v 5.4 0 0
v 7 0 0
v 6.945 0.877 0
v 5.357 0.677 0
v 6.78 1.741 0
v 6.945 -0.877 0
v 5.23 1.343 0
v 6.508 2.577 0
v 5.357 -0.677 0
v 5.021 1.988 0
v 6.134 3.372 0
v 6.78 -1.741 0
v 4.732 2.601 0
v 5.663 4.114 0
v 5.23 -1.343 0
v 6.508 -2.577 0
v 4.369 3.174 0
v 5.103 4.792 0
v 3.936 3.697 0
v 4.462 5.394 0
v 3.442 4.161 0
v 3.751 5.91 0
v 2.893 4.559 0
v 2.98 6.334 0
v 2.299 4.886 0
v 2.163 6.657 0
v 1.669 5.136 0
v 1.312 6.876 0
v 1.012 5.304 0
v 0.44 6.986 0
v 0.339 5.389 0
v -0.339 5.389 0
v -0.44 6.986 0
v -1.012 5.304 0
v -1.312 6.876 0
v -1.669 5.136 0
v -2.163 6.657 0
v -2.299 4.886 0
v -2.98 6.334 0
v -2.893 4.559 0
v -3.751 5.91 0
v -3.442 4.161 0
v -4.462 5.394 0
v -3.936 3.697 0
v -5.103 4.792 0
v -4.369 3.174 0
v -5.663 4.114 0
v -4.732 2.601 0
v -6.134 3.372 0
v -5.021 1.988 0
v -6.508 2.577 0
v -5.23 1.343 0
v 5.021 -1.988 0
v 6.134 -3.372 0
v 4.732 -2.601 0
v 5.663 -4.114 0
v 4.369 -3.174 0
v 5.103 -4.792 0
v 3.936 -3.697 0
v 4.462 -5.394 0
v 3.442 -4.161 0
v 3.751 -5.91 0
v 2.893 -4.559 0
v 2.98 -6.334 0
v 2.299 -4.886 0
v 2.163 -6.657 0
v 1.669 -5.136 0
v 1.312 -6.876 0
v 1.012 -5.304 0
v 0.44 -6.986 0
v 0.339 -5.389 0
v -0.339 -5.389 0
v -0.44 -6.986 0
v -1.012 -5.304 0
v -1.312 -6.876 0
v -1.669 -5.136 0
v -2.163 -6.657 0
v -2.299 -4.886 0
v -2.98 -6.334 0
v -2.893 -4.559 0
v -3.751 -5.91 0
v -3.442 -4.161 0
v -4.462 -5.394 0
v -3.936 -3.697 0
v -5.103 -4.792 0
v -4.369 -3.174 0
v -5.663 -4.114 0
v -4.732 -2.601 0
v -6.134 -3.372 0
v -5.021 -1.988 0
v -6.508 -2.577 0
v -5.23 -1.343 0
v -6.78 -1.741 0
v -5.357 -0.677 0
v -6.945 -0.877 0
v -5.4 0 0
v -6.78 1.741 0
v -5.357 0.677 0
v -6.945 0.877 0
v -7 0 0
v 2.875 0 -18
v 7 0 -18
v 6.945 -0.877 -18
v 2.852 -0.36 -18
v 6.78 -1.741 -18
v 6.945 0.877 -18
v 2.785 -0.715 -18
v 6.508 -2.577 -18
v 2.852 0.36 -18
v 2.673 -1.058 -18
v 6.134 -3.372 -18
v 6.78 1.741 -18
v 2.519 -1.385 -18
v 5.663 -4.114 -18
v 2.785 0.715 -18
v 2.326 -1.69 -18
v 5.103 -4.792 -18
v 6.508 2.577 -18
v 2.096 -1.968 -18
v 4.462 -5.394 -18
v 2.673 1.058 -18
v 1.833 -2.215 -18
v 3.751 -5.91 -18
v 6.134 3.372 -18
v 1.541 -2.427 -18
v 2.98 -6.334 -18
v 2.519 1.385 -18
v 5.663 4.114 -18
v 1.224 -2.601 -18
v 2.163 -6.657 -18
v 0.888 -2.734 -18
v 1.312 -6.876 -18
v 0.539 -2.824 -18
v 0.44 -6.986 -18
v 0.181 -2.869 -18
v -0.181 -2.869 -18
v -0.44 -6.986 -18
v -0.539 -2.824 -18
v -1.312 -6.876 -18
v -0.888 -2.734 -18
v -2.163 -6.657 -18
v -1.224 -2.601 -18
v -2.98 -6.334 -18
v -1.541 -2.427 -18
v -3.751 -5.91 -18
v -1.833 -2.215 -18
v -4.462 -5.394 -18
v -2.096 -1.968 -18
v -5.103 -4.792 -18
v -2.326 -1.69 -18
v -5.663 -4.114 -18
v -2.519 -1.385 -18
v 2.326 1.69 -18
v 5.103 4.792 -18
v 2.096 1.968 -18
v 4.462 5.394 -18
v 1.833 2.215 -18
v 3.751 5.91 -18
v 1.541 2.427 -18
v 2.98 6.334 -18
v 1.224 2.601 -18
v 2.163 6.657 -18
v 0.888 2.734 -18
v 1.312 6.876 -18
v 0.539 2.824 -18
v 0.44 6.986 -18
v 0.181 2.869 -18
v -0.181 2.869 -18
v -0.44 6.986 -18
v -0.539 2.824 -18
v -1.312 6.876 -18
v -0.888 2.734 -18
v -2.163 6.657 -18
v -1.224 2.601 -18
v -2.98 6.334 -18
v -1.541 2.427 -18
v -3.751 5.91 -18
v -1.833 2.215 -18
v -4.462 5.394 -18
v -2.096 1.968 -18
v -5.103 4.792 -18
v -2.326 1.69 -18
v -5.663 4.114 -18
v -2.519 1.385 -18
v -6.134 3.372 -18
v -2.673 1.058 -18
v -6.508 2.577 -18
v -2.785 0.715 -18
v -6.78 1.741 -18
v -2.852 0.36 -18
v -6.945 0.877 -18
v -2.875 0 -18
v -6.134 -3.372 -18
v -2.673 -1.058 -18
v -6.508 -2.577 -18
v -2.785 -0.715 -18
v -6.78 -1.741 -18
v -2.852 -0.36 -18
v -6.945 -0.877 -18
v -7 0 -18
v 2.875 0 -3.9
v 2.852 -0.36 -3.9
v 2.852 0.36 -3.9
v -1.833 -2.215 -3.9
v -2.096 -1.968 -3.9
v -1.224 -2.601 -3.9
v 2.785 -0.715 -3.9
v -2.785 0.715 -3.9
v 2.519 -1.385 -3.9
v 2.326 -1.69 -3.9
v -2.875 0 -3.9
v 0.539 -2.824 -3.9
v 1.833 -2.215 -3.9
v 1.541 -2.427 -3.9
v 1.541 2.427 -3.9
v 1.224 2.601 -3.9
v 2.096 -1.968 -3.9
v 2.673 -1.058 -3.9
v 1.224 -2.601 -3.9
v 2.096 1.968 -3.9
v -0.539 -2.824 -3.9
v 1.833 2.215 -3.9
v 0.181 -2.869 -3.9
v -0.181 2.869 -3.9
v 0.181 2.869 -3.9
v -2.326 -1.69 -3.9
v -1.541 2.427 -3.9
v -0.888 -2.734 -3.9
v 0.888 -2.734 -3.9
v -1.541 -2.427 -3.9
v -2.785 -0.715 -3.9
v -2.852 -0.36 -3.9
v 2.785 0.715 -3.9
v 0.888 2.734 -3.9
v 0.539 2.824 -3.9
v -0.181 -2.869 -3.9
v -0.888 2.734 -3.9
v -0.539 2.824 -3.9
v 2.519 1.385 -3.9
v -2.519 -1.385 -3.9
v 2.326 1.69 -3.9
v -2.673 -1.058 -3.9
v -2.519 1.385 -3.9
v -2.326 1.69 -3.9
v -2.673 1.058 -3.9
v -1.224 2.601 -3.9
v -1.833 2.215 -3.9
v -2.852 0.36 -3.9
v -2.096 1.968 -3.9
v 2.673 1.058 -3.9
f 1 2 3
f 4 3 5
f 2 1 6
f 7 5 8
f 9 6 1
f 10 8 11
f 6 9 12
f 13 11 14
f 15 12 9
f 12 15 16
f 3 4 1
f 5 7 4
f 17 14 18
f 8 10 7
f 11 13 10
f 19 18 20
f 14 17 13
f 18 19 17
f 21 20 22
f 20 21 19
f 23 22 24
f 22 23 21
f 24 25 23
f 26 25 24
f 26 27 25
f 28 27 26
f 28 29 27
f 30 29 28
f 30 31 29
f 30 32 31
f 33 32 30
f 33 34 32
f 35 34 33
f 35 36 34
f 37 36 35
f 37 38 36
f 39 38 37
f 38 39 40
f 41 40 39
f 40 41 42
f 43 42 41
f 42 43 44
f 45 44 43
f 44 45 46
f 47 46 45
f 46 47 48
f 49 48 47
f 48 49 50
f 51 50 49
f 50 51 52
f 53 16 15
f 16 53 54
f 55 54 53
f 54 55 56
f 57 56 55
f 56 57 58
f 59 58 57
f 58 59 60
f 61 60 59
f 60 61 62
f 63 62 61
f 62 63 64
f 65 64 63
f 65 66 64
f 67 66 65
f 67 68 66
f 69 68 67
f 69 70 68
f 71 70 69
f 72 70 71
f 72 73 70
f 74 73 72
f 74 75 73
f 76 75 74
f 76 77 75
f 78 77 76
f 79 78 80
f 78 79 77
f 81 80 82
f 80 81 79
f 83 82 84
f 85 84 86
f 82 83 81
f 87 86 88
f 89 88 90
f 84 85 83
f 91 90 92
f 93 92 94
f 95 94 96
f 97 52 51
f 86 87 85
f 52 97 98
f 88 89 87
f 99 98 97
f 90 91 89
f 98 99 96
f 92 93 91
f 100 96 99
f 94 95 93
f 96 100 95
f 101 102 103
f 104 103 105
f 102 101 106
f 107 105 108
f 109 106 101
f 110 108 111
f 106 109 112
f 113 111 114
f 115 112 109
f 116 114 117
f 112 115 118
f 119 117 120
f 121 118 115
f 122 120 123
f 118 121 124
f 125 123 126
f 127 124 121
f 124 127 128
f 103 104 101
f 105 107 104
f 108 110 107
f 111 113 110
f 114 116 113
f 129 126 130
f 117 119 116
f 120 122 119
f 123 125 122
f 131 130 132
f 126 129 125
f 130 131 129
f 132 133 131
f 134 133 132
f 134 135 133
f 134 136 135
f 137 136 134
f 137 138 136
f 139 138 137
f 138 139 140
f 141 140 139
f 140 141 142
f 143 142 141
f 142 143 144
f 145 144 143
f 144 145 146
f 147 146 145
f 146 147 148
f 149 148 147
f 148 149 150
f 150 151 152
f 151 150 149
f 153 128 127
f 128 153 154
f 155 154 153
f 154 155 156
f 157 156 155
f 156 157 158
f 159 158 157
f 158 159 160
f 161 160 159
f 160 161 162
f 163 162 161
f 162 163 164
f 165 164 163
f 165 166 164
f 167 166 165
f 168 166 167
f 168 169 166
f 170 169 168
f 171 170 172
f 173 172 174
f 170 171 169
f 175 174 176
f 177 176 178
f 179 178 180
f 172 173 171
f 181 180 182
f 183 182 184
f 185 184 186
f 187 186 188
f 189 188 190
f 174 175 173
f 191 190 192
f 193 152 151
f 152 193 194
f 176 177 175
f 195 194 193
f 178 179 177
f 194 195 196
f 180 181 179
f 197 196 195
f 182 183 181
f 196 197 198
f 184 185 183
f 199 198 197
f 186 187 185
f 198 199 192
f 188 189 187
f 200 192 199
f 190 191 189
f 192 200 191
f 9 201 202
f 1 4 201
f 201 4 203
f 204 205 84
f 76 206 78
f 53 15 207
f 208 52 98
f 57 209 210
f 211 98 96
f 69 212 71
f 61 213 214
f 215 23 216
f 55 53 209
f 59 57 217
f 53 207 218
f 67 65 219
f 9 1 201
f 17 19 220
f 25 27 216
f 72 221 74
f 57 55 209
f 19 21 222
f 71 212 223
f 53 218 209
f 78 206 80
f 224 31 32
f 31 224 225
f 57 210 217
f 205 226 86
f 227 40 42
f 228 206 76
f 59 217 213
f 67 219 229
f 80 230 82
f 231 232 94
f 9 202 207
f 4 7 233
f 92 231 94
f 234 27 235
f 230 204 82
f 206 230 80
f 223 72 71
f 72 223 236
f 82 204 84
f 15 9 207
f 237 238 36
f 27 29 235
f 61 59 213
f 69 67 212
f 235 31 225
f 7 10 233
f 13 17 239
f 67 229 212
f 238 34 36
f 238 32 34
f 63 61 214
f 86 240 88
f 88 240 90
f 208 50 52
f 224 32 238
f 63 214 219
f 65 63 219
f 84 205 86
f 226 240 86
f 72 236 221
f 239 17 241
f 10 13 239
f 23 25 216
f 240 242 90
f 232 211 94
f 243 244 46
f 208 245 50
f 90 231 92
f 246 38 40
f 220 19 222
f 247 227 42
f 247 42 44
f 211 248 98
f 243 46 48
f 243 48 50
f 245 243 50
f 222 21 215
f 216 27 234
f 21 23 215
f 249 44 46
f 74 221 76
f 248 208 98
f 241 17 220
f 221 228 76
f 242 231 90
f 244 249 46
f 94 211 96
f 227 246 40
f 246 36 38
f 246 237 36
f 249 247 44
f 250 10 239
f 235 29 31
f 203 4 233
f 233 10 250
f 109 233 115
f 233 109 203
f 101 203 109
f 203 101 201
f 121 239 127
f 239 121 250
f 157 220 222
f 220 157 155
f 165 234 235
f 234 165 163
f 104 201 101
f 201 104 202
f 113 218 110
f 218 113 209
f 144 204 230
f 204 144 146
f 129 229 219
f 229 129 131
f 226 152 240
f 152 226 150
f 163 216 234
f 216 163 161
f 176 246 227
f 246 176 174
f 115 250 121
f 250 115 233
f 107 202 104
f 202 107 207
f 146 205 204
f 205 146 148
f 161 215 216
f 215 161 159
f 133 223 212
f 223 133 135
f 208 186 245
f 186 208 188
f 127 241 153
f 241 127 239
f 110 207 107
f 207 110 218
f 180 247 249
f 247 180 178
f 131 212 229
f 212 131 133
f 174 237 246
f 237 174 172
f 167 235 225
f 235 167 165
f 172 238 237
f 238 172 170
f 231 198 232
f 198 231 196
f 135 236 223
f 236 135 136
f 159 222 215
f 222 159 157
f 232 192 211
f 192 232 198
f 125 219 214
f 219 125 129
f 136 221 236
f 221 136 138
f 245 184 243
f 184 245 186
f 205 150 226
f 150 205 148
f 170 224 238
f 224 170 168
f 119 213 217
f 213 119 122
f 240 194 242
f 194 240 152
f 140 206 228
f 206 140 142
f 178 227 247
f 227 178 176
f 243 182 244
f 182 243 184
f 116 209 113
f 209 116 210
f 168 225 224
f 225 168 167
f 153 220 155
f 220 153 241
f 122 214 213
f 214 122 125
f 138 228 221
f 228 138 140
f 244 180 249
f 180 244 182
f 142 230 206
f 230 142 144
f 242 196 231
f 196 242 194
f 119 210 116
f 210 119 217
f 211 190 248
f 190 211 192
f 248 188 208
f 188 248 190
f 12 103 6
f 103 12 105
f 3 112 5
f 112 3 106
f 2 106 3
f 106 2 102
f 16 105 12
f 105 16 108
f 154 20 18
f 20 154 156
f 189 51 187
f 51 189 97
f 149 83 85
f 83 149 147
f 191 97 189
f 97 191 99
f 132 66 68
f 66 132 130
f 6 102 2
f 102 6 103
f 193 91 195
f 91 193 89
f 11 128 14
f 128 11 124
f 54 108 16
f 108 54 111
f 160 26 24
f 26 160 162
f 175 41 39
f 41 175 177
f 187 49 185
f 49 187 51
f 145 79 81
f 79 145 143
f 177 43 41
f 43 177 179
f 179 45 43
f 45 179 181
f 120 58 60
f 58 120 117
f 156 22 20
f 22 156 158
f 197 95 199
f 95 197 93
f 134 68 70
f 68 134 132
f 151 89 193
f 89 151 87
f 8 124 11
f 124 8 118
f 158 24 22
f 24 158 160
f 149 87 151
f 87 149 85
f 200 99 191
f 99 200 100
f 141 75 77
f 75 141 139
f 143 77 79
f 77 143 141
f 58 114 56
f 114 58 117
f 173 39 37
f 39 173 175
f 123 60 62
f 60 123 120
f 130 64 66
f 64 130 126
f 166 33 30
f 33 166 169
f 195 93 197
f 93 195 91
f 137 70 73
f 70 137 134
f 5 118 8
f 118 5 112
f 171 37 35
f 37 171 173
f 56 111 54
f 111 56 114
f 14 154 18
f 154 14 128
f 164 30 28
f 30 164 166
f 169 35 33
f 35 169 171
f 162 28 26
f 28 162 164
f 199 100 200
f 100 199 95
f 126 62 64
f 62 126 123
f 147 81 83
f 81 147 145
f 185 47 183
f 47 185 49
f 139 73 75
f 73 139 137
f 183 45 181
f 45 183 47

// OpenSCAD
$fn = 50;


difference() {
	union() {
		translate(v = [0, 0, -18.0000000000]) {
			cylinder(h = 18, r = 7.0000000000);
		}
		cylinder(h = 0, r = 13.0000000000);
	}
	union() {
		translate(v = [0, 0, 0]) {
			rotate(a = [0, 0, 0]) {
				difference() {
					union() {
						#translate(v = [0, 0, -18.0000000000]) {
							cylinder(h = 18, r = 2.6000000000);
						}
						#translate(v = [0, 0, -3.9000000000]) {
							cylinder(h = 3.9000000000, r = 7.0000000000, r1 = 2.8750000000, r2 = 5.4000000000);
						}
						#translate(v = [0, 0, -18.0000000000]) {
							cylinder(h = 18, r = 2.8750000000);
						}
						#translate(v = [0, 0, -18.0000000000]) {
							cylinder(h = 18, r = 2.6000000000);
						}
					}
					union();
				}
			}
		}
	}
}
